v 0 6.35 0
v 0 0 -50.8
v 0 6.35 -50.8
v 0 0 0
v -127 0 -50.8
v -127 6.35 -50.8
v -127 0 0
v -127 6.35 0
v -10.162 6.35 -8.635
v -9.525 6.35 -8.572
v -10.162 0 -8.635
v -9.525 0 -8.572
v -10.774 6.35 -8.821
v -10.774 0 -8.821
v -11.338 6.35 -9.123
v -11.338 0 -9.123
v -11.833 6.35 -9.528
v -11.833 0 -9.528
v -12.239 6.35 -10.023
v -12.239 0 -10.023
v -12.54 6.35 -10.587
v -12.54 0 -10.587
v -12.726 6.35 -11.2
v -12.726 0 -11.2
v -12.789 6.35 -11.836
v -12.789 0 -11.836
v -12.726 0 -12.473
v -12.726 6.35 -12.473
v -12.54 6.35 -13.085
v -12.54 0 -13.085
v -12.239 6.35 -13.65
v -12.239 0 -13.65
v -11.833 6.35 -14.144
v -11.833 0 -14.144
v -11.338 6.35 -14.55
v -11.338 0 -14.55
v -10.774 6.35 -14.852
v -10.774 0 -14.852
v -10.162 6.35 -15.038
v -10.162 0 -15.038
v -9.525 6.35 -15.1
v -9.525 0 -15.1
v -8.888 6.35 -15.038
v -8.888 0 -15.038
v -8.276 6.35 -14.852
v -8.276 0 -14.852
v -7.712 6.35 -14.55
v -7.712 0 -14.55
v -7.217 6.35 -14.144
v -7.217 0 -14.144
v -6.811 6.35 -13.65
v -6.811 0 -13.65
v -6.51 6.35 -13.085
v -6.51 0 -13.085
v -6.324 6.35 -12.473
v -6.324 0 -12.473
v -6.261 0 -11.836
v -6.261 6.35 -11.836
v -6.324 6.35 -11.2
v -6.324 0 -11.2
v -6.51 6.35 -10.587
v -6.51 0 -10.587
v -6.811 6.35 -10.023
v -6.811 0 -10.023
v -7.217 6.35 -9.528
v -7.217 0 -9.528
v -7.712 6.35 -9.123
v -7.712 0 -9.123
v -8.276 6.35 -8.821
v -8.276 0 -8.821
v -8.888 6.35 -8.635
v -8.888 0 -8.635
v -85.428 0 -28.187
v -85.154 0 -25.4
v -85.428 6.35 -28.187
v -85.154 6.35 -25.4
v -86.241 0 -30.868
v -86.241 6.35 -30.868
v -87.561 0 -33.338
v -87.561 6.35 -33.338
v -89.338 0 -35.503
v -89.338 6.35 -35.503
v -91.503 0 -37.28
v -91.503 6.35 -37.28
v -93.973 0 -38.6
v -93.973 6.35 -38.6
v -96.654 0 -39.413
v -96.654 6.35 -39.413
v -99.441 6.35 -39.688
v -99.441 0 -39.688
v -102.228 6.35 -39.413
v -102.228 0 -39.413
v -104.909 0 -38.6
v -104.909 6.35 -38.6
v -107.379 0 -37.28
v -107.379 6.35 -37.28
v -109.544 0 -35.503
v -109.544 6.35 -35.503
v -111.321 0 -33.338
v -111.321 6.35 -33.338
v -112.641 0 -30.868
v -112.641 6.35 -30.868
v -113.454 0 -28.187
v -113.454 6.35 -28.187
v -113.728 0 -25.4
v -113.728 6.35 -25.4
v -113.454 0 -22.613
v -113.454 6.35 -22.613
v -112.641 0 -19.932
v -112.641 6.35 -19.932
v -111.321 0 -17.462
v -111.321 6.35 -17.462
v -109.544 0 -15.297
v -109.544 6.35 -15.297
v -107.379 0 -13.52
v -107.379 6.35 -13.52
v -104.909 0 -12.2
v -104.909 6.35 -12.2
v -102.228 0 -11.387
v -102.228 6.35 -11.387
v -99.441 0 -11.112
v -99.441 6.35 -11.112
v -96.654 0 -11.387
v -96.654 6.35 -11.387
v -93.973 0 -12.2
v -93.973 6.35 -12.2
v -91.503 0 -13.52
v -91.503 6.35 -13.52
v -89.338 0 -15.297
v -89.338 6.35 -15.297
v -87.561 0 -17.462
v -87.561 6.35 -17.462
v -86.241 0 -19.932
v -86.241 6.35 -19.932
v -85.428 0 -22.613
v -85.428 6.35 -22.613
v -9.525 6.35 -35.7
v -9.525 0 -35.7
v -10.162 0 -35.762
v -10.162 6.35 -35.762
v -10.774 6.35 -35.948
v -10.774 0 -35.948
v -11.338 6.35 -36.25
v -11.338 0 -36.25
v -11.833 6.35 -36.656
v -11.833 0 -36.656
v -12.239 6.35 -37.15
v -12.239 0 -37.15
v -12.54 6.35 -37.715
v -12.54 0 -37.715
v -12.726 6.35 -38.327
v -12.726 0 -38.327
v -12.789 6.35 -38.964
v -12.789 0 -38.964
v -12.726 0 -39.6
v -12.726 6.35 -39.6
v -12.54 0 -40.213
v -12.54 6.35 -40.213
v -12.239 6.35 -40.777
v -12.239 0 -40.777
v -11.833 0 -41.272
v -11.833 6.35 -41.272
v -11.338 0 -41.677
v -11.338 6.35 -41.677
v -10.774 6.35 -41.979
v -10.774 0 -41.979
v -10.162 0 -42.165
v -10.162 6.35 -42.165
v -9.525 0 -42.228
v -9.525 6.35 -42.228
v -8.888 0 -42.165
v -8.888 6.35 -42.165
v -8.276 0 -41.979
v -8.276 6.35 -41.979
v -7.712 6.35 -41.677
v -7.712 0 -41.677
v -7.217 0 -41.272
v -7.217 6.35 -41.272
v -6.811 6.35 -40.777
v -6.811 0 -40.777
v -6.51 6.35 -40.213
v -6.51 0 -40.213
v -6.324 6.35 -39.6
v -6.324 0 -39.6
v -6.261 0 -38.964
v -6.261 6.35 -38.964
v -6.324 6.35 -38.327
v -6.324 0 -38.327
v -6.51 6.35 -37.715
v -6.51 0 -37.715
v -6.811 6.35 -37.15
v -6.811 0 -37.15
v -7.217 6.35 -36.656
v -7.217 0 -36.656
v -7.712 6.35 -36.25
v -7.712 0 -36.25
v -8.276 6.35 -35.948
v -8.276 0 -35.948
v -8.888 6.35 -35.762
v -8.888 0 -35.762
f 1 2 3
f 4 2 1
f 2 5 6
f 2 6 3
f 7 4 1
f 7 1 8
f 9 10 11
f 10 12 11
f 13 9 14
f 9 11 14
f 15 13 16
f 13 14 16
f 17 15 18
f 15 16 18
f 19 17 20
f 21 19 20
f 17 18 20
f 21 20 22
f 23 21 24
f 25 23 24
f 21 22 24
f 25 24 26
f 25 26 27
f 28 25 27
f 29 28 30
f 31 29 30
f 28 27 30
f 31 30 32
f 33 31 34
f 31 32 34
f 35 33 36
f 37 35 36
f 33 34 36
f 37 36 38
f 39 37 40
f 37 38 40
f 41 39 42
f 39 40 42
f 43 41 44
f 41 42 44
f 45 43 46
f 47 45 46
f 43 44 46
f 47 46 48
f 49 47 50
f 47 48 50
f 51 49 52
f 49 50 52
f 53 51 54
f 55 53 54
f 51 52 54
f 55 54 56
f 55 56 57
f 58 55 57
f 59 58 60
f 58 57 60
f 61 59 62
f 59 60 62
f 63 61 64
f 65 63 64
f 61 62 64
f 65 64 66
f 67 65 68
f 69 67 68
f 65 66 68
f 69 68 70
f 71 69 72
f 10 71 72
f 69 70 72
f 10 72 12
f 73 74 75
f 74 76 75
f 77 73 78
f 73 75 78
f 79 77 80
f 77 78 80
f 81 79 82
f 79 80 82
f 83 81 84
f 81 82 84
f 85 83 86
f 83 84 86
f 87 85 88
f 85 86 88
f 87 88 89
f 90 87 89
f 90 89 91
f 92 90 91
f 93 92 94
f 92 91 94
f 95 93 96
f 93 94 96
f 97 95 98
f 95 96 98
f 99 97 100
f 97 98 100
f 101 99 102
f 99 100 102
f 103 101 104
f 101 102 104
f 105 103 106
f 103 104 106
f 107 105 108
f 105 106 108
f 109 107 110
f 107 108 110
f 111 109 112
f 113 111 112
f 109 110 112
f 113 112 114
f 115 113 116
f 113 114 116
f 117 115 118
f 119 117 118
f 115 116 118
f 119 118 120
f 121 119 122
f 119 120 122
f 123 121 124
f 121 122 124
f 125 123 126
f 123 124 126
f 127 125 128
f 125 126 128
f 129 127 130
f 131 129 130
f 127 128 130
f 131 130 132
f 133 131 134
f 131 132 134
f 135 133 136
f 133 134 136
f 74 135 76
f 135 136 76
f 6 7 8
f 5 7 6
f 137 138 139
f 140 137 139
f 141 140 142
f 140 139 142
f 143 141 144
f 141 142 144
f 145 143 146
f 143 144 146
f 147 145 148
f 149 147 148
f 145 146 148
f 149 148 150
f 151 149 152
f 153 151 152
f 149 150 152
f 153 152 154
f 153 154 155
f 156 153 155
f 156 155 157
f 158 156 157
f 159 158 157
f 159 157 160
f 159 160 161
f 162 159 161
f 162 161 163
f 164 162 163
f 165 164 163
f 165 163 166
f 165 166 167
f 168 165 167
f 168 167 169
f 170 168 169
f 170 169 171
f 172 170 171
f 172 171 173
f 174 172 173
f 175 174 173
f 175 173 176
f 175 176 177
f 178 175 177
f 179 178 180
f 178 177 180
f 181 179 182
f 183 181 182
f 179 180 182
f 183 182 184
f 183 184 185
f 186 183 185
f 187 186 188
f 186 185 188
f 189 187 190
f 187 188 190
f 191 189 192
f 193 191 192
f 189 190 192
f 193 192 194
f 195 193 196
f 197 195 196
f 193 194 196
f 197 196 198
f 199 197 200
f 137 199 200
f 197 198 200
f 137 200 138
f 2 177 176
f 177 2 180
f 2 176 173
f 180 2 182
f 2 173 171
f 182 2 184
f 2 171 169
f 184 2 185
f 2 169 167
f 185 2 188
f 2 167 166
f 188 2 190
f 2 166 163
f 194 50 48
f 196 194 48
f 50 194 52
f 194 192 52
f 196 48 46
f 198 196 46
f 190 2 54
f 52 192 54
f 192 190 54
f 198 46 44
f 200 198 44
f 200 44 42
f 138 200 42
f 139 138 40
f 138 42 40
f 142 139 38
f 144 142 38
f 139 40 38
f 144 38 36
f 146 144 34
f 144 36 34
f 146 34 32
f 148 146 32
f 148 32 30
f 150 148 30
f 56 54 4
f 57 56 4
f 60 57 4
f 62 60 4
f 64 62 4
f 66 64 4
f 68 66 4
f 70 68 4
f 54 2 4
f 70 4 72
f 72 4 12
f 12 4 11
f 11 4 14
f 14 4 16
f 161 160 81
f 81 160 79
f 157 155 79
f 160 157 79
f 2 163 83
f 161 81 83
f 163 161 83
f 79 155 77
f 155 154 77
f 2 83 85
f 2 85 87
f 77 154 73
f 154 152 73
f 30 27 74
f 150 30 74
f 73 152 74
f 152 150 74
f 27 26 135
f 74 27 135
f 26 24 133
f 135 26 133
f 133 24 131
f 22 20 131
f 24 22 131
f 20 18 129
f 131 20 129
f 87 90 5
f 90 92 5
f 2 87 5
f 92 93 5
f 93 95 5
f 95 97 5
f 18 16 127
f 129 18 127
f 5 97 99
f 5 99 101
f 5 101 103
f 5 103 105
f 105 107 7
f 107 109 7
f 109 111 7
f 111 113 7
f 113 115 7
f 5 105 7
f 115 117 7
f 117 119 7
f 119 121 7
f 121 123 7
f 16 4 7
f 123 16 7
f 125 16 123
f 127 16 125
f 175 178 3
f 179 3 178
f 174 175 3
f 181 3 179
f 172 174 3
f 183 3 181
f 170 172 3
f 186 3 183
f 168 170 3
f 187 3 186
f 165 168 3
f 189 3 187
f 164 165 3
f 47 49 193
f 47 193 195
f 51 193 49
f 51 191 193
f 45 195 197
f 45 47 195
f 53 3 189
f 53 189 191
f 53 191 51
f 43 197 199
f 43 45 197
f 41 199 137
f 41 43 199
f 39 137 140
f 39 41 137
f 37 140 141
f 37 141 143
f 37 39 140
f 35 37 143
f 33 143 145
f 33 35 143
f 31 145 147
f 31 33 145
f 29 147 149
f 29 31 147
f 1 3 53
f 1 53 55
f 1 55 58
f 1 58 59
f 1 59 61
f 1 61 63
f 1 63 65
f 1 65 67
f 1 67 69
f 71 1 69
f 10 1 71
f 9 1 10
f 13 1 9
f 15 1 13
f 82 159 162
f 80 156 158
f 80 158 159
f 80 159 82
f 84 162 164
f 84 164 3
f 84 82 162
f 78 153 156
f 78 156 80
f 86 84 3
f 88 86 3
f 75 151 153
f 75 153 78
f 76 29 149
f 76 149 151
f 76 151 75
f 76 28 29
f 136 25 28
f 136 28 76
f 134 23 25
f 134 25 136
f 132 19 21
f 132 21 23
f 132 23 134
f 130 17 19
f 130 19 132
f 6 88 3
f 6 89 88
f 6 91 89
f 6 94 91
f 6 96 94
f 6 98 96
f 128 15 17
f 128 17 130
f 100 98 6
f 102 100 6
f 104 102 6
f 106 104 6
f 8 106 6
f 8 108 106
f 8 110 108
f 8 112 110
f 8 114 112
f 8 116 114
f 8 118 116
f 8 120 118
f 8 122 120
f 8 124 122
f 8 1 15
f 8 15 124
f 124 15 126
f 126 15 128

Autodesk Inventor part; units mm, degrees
ref_plane "YZ Plane" through (0, 0, 0) normal (1, 0, 0) x (0, 1, 0)
ref_plane "XZ Plane" through (0, 0, 0) normal (0, 1, 0) x (-1, 0, 0)
ref_plane "XY Plane" through (0, 0, 0) normal (0, 0, 1) x (1, 0, 0)
sketch "Sketch1" plane through (0, 0, 0) normal (0, 1, 0) x (-1, 0, 0)
  line L0 (0, 0) -> (127, 0)
  line L1 (127, 0) -> (127, -50.8)
  line L2 (127, -50.8) -> (0, -50.8)
  line L3 (0, -50.8) -> (0, 0)
  dimension "d0" = 127
  dimension "d1" = 50.8
extrude "Extrusion1" add sketch "Sketch1" along normal blind 6.35
sketch "Sketch2" plane through (0, 6.35, 0) normal (0, 1, 0) x (1, 0, 0)
  circle A0 centre (-99.441, 25.4) radius 14.2875
  line L0 (0, 0) -> (0, 50.8) projected
  dimension "d4" = 28.575
  dimension "d5" = 99.441
extrude "Extrusion2" cut sketch "Sketch2" against normal blind 6.35
sketch "Sketch3" plane through (0, 6.35, 0) normal (0, 1, 0) x (1, 0, 0)
  line L0 (0, 0) -> (0, 50.8) projected
  line L1 (0, 0) -> (-9.525, 11.8364)
  line L2 (0, 50.8) -> (-9.525, 38.9636)
  dimension "d8" = 27.1272
  dimension "d9" = 9.525
  dimension "d10" = 9.525
hole "Hole1" at (-9.525, 6.35, -11.8364) at (-9.525, 6.35, -38.9636) direction (0, -1, 0) diameter 6.5278 depth 25.4 tip angle 118
properties part number "Pin Support Plate"
